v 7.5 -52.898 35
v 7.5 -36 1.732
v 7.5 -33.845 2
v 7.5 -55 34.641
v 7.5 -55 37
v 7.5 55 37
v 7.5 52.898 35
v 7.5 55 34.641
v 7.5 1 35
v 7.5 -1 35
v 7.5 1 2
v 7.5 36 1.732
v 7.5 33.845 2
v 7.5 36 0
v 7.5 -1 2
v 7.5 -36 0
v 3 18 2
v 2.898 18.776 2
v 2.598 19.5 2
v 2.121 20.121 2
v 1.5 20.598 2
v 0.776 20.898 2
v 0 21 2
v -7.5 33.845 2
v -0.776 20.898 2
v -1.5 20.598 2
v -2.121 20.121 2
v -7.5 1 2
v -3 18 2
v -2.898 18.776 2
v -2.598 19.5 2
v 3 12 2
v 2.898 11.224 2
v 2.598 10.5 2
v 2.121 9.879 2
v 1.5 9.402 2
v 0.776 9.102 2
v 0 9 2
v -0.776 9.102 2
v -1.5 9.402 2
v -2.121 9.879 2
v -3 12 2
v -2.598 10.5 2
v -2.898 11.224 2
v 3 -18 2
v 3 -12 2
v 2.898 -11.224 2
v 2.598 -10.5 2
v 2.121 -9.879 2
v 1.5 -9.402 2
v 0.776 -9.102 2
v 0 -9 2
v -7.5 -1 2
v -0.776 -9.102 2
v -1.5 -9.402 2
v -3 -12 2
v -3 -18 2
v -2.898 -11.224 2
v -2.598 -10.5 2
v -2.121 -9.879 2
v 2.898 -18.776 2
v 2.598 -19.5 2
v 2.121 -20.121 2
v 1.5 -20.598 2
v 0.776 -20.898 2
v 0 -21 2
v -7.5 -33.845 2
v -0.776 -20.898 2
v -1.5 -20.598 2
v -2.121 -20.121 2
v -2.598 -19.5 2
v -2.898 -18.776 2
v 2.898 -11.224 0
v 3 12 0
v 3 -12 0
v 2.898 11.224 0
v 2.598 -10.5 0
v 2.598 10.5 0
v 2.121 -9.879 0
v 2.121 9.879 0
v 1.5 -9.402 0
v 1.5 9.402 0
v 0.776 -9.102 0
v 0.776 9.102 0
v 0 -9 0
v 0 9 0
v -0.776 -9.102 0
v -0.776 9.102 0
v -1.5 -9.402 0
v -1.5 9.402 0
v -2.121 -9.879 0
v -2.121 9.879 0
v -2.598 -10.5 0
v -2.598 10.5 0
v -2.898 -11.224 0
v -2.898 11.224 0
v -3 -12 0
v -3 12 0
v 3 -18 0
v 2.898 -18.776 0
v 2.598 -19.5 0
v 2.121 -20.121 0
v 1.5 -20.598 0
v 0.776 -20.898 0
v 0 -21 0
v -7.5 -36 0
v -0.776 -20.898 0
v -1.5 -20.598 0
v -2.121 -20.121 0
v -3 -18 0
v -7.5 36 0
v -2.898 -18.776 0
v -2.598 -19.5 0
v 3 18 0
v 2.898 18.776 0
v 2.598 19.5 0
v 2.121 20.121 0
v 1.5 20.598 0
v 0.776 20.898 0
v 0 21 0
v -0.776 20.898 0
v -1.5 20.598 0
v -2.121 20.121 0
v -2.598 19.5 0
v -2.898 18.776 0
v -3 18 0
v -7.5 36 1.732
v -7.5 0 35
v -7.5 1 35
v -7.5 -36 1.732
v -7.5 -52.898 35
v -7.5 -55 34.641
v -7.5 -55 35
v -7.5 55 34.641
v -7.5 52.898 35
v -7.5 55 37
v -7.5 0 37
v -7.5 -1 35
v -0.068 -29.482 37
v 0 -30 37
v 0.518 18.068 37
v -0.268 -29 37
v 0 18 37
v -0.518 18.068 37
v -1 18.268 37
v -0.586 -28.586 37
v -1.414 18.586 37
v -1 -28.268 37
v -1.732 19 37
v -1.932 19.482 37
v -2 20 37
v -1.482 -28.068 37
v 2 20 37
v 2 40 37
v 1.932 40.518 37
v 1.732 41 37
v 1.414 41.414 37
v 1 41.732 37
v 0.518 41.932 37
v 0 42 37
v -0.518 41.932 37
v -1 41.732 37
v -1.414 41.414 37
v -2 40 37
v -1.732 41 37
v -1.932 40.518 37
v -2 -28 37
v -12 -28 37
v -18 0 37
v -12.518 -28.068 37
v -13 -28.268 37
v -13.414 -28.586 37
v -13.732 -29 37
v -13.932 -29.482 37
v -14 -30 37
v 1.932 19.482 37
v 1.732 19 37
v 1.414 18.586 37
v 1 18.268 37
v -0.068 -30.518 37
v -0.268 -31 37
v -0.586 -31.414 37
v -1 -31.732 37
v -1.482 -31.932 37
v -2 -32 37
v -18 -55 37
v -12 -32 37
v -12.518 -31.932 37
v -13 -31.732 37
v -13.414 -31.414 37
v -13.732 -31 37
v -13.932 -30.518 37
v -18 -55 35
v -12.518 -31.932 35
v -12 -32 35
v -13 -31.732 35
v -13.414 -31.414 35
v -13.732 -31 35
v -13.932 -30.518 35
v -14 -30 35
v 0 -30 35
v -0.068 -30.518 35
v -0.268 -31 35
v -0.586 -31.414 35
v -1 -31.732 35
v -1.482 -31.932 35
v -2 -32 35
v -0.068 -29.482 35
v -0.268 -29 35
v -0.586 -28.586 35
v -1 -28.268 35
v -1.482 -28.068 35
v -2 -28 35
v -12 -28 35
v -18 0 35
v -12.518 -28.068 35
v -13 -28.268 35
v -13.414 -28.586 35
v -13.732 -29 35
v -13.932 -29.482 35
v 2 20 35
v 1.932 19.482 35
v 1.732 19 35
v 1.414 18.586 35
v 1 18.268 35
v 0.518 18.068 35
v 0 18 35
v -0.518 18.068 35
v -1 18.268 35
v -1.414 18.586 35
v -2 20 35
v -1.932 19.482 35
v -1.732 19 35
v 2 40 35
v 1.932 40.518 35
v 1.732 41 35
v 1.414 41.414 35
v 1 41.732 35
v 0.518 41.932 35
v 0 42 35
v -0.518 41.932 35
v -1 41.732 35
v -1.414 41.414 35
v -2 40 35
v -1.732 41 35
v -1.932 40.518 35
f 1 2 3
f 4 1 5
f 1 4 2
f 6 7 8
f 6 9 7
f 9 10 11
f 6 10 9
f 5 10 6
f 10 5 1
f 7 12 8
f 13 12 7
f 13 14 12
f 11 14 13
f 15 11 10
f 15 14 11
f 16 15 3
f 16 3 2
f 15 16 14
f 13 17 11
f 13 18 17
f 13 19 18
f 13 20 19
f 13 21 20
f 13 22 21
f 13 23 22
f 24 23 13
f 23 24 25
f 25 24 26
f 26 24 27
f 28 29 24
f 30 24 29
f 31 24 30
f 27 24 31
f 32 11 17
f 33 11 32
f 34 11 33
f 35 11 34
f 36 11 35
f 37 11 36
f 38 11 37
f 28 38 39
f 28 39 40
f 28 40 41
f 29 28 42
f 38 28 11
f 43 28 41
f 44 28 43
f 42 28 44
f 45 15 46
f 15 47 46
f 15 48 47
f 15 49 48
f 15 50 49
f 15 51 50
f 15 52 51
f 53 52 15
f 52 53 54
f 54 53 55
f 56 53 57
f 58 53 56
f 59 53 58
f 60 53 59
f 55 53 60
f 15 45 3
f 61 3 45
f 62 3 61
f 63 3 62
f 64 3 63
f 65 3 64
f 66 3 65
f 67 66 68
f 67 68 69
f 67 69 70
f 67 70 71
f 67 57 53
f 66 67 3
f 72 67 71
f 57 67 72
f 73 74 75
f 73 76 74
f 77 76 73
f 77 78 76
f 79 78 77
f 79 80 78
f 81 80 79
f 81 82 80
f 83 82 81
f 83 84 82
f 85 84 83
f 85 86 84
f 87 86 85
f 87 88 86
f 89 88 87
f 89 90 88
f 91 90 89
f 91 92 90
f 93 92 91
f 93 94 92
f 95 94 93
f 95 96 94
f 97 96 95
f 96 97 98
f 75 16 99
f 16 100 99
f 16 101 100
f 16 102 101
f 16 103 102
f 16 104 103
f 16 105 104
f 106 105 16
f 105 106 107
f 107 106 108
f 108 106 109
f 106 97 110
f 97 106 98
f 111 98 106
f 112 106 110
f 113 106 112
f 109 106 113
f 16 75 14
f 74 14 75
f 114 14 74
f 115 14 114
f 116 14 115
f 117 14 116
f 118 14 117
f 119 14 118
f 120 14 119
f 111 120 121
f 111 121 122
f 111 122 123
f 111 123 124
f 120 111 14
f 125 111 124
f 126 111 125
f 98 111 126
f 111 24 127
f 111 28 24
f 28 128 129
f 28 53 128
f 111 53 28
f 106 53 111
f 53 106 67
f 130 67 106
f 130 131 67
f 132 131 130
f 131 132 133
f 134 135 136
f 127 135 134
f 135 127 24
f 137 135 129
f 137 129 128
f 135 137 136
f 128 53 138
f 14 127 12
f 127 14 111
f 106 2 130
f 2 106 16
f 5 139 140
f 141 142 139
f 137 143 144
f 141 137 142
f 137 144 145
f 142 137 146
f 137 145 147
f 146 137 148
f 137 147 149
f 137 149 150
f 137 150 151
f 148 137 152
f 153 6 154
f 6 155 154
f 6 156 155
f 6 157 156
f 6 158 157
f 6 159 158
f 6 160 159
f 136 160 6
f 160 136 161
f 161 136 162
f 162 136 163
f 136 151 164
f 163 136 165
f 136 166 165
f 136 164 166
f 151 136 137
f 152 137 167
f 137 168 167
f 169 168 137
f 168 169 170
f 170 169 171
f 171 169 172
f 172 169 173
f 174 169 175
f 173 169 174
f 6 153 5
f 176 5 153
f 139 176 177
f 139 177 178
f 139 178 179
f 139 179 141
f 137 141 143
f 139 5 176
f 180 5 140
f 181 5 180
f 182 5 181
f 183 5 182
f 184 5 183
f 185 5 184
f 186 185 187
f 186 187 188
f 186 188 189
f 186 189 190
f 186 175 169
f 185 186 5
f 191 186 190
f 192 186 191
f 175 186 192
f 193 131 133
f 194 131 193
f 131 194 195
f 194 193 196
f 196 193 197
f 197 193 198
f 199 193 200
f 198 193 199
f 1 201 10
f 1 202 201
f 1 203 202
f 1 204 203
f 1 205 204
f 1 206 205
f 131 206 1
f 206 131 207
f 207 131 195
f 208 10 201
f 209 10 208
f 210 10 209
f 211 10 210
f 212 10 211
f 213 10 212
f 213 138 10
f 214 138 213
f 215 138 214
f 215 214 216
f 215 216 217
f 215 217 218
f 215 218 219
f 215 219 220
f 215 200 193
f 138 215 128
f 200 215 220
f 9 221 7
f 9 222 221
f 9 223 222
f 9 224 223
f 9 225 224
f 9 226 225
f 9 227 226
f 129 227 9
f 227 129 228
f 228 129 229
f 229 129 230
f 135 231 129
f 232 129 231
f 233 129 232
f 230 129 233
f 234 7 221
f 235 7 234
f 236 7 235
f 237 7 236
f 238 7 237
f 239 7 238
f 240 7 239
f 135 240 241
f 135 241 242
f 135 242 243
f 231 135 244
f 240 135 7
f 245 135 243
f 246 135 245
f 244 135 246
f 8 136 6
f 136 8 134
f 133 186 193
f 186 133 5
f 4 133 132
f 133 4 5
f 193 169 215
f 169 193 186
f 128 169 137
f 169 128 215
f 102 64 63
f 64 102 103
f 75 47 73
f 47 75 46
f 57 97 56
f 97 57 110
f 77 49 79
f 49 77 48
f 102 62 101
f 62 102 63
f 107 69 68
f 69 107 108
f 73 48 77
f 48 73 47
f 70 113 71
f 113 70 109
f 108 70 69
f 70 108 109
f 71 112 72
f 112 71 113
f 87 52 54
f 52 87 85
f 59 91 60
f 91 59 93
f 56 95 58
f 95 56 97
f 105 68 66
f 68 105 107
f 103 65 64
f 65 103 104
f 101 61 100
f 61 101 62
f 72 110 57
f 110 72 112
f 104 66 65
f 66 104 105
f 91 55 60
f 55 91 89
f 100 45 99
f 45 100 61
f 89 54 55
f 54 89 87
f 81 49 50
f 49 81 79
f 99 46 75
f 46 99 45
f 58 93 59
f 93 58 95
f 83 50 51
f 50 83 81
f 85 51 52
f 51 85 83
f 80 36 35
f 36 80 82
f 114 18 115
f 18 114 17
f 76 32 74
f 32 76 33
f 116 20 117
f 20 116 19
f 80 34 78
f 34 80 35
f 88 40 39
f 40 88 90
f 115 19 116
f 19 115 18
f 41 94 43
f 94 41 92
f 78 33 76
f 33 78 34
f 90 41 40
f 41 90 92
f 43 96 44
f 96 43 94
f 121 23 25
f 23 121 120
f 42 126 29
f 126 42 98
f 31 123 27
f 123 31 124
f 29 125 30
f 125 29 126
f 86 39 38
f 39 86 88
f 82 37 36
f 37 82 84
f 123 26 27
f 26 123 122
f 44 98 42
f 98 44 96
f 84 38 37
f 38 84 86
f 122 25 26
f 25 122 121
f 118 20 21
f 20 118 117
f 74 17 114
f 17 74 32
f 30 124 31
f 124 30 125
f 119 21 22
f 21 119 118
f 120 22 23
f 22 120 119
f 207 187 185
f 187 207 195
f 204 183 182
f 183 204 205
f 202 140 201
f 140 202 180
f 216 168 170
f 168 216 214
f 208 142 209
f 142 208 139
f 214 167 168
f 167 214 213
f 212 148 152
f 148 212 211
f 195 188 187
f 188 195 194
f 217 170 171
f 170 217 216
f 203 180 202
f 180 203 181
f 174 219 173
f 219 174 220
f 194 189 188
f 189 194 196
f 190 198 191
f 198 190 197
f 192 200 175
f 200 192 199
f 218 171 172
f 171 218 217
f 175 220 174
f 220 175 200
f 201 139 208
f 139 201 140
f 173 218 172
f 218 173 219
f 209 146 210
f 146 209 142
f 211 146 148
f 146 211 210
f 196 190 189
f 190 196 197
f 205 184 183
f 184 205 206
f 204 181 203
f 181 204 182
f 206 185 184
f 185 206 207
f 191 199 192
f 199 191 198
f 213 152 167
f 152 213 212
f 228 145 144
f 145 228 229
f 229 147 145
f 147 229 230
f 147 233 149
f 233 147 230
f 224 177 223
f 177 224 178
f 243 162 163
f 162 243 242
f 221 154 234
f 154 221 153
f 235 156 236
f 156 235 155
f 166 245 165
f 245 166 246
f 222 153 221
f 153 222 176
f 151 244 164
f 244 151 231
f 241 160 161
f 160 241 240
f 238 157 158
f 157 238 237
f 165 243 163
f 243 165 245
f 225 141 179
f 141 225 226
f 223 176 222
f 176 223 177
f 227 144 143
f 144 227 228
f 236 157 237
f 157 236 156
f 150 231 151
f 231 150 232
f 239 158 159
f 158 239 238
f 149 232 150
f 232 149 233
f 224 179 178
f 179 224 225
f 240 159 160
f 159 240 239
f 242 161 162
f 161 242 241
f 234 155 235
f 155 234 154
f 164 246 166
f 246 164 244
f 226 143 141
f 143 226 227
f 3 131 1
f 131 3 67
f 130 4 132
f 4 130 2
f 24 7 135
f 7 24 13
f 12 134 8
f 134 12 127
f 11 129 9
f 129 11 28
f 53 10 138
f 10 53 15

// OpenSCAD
module slopeScaffold(){
            intersection(){
            translate([-7.5,-55,0])
                cube([15,110,37]);
            translate([-7.5,-35,0])
            rotate([30,0,0])
                cube([15,2,100]);
    }
}

union(){
    difference(){
        union(){
        translate([-7.5,-36,0])
            cube([15,72,2]);
        translate([-7.5,-55,35])
            cube([15,110,2]);
        translate([-18,-55,35])
            cube([17,55,2]);
//        translate([-7.5,-30-10,35])
//            cube([15,20,4]);
//        translate([-7.5,30-10,35])
//            cube([15,20,4]);
        }
//        translate([-10,-53,2])
//            #cube([20,106,32.5]);
//        translate([-10,-30-7.5,36.5])
//            cube([20,15,20]);
//        translate([-10,30-7.5,36.5])
//            cube([20,15,20]);
        
        
        for (yy=[-15,15]){
        
        translate([0,yy,-1])
            hull(){
                translate([0,-3,0])
                    cylinder(d=6,h=10,$fn=24);
                translate([0,3,0])
                    cylinder(d=6,h=10,$fn=24);
                }
            }
//        translate([0,-15,10])
//            cylinder(d=4,h=50,$fn=24);
//        translate([0,15,10])
//            cylinder(d=4,h=50,$fn=24);    
//        
        hull(){
        translate([-2,-30,20])
            cylinder(d=4,h=50,$fn=24);
        translate([-12,-30,20])
            cylinder(d=4,h=50,$fn=24);

        }
        hull(){
        translate([0,20,20])
            cylinder(d=4,h=50,$fn=24);
        translate([0,40,20])
            cylinder(d=4,h=50,$fn=24);
        }
        
//        translate([0,-100,10])
//            rotate([-90,0,0])
//                cylinder(d=4,h=200,$fn=24);
//        translate([0,-100,20])
//            rotate([-90,0,0])
//                cylinder(d=4,h=200,$fn=24);
        
    }
    translate([-7.5,-1,0])
    cube([15,2,37]);
    slopeScaffold();
    mirror([0,1,0])
    slopeScaffold();
}
